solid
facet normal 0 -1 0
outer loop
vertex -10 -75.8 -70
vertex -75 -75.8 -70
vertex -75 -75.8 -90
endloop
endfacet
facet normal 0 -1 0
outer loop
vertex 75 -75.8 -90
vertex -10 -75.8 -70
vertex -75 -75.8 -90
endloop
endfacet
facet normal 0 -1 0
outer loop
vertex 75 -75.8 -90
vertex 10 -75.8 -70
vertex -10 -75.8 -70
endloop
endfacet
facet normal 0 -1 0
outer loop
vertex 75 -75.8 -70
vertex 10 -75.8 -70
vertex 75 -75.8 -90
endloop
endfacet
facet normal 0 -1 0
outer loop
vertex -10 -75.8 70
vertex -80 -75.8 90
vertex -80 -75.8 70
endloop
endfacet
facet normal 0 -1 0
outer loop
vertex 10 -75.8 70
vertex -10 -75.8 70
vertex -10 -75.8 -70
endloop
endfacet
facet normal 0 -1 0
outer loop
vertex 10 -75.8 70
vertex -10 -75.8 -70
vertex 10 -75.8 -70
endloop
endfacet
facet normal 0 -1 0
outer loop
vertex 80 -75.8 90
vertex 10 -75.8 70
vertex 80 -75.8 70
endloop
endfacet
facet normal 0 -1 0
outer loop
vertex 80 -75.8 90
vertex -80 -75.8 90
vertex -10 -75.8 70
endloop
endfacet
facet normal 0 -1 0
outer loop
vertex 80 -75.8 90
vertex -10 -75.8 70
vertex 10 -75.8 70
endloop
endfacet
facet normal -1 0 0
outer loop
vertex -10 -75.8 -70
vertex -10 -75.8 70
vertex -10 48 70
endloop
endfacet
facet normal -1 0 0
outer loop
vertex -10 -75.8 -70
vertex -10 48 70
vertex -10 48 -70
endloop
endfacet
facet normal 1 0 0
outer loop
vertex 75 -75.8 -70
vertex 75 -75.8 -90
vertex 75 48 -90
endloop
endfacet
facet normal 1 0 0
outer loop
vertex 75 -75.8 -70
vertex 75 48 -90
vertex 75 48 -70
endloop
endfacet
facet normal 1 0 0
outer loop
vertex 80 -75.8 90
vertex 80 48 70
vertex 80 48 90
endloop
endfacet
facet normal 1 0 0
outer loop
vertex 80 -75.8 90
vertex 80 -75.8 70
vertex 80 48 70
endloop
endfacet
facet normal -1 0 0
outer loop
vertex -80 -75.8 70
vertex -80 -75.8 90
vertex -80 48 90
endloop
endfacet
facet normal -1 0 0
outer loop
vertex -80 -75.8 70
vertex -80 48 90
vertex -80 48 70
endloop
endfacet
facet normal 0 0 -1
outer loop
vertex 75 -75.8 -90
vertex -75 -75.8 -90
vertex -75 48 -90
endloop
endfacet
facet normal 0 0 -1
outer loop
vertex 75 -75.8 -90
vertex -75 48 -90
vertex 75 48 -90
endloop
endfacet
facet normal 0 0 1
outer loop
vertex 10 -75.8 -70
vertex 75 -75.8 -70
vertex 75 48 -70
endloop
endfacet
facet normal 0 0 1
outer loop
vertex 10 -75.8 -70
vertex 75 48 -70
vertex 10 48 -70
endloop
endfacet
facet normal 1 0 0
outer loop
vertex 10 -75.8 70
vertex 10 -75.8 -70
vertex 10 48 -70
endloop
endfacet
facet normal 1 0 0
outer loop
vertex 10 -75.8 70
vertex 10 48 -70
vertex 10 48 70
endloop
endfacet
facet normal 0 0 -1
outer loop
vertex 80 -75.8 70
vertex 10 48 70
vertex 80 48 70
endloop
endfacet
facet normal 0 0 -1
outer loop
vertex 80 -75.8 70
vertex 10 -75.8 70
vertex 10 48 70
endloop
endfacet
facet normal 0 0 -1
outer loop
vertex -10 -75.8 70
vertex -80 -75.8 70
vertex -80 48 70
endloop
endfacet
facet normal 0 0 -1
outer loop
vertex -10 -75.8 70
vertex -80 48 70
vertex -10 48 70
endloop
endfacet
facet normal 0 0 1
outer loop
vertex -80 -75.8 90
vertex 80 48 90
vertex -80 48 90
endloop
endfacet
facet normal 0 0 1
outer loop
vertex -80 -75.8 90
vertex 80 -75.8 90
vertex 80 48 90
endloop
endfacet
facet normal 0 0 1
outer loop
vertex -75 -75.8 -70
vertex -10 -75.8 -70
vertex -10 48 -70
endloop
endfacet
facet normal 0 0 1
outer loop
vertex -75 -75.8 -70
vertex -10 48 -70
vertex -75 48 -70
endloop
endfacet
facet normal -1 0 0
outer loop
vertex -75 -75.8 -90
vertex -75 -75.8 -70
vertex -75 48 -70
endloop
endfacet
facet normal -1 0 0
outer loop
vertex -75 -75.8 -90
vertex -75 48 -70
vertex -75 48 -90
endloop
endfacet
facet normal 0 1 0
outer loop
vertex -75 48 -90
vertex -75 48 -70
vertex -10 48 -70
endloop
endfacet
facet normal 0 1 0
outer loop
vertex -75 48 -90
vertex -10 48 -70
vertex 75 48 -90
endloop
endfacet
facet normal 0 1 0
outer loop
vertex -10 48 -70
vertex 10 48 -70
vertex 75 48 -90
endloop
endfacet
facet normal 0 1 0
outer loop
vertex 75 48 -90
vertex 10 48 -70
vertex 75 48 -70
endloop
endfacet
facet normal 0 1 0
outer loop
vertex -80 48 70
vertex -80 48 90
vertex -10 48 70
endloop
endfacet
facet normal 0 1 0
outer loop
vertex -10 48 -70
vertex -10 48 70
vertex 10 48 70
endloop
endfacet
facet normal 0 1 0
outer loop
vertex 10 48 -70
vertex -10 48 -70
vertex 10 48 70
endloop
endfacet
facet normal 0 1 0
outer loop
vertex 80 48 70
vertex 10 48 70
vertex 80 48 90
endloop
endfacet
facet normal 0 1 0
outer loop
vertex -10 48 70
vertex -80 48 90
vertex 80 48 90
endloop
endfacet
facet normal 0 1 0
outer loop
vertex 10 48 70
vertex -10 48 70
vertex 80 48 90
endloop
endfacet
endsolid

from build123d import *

# Parameters (mm, degrees)
F1_DEPTH = 75.8
F2_DEPTH = 48


with BuildPart() as f1:
    # F0 (on Front) → F1 (new body)
    with BuildSketch(Plane.XZ):
        Polygon((80, 90), (-80, 90), (-80, 70), (-10, 70), (-10, -70), (-75, -70), (-75, -90), (75, -90), (75, -70), (10, -70), (10, 70), (80, 70), align=None)
    extrude(amount=F1_DEPTH)

    # F0 (on Front) → F2 (join, symmetric)
    with BuildSketch(Plane.XZ):
        Polygon((80, 90), (-80, 90), (-80, 70), (-10, 70), (-10, -70), (-75, -70), (-75, -90), (75, -90), (75, -70), (10, -70), (10, 70), (80, 70), align=None)
    extrude(amount=F2_DEPTH, both=True)


solid = f1.part
